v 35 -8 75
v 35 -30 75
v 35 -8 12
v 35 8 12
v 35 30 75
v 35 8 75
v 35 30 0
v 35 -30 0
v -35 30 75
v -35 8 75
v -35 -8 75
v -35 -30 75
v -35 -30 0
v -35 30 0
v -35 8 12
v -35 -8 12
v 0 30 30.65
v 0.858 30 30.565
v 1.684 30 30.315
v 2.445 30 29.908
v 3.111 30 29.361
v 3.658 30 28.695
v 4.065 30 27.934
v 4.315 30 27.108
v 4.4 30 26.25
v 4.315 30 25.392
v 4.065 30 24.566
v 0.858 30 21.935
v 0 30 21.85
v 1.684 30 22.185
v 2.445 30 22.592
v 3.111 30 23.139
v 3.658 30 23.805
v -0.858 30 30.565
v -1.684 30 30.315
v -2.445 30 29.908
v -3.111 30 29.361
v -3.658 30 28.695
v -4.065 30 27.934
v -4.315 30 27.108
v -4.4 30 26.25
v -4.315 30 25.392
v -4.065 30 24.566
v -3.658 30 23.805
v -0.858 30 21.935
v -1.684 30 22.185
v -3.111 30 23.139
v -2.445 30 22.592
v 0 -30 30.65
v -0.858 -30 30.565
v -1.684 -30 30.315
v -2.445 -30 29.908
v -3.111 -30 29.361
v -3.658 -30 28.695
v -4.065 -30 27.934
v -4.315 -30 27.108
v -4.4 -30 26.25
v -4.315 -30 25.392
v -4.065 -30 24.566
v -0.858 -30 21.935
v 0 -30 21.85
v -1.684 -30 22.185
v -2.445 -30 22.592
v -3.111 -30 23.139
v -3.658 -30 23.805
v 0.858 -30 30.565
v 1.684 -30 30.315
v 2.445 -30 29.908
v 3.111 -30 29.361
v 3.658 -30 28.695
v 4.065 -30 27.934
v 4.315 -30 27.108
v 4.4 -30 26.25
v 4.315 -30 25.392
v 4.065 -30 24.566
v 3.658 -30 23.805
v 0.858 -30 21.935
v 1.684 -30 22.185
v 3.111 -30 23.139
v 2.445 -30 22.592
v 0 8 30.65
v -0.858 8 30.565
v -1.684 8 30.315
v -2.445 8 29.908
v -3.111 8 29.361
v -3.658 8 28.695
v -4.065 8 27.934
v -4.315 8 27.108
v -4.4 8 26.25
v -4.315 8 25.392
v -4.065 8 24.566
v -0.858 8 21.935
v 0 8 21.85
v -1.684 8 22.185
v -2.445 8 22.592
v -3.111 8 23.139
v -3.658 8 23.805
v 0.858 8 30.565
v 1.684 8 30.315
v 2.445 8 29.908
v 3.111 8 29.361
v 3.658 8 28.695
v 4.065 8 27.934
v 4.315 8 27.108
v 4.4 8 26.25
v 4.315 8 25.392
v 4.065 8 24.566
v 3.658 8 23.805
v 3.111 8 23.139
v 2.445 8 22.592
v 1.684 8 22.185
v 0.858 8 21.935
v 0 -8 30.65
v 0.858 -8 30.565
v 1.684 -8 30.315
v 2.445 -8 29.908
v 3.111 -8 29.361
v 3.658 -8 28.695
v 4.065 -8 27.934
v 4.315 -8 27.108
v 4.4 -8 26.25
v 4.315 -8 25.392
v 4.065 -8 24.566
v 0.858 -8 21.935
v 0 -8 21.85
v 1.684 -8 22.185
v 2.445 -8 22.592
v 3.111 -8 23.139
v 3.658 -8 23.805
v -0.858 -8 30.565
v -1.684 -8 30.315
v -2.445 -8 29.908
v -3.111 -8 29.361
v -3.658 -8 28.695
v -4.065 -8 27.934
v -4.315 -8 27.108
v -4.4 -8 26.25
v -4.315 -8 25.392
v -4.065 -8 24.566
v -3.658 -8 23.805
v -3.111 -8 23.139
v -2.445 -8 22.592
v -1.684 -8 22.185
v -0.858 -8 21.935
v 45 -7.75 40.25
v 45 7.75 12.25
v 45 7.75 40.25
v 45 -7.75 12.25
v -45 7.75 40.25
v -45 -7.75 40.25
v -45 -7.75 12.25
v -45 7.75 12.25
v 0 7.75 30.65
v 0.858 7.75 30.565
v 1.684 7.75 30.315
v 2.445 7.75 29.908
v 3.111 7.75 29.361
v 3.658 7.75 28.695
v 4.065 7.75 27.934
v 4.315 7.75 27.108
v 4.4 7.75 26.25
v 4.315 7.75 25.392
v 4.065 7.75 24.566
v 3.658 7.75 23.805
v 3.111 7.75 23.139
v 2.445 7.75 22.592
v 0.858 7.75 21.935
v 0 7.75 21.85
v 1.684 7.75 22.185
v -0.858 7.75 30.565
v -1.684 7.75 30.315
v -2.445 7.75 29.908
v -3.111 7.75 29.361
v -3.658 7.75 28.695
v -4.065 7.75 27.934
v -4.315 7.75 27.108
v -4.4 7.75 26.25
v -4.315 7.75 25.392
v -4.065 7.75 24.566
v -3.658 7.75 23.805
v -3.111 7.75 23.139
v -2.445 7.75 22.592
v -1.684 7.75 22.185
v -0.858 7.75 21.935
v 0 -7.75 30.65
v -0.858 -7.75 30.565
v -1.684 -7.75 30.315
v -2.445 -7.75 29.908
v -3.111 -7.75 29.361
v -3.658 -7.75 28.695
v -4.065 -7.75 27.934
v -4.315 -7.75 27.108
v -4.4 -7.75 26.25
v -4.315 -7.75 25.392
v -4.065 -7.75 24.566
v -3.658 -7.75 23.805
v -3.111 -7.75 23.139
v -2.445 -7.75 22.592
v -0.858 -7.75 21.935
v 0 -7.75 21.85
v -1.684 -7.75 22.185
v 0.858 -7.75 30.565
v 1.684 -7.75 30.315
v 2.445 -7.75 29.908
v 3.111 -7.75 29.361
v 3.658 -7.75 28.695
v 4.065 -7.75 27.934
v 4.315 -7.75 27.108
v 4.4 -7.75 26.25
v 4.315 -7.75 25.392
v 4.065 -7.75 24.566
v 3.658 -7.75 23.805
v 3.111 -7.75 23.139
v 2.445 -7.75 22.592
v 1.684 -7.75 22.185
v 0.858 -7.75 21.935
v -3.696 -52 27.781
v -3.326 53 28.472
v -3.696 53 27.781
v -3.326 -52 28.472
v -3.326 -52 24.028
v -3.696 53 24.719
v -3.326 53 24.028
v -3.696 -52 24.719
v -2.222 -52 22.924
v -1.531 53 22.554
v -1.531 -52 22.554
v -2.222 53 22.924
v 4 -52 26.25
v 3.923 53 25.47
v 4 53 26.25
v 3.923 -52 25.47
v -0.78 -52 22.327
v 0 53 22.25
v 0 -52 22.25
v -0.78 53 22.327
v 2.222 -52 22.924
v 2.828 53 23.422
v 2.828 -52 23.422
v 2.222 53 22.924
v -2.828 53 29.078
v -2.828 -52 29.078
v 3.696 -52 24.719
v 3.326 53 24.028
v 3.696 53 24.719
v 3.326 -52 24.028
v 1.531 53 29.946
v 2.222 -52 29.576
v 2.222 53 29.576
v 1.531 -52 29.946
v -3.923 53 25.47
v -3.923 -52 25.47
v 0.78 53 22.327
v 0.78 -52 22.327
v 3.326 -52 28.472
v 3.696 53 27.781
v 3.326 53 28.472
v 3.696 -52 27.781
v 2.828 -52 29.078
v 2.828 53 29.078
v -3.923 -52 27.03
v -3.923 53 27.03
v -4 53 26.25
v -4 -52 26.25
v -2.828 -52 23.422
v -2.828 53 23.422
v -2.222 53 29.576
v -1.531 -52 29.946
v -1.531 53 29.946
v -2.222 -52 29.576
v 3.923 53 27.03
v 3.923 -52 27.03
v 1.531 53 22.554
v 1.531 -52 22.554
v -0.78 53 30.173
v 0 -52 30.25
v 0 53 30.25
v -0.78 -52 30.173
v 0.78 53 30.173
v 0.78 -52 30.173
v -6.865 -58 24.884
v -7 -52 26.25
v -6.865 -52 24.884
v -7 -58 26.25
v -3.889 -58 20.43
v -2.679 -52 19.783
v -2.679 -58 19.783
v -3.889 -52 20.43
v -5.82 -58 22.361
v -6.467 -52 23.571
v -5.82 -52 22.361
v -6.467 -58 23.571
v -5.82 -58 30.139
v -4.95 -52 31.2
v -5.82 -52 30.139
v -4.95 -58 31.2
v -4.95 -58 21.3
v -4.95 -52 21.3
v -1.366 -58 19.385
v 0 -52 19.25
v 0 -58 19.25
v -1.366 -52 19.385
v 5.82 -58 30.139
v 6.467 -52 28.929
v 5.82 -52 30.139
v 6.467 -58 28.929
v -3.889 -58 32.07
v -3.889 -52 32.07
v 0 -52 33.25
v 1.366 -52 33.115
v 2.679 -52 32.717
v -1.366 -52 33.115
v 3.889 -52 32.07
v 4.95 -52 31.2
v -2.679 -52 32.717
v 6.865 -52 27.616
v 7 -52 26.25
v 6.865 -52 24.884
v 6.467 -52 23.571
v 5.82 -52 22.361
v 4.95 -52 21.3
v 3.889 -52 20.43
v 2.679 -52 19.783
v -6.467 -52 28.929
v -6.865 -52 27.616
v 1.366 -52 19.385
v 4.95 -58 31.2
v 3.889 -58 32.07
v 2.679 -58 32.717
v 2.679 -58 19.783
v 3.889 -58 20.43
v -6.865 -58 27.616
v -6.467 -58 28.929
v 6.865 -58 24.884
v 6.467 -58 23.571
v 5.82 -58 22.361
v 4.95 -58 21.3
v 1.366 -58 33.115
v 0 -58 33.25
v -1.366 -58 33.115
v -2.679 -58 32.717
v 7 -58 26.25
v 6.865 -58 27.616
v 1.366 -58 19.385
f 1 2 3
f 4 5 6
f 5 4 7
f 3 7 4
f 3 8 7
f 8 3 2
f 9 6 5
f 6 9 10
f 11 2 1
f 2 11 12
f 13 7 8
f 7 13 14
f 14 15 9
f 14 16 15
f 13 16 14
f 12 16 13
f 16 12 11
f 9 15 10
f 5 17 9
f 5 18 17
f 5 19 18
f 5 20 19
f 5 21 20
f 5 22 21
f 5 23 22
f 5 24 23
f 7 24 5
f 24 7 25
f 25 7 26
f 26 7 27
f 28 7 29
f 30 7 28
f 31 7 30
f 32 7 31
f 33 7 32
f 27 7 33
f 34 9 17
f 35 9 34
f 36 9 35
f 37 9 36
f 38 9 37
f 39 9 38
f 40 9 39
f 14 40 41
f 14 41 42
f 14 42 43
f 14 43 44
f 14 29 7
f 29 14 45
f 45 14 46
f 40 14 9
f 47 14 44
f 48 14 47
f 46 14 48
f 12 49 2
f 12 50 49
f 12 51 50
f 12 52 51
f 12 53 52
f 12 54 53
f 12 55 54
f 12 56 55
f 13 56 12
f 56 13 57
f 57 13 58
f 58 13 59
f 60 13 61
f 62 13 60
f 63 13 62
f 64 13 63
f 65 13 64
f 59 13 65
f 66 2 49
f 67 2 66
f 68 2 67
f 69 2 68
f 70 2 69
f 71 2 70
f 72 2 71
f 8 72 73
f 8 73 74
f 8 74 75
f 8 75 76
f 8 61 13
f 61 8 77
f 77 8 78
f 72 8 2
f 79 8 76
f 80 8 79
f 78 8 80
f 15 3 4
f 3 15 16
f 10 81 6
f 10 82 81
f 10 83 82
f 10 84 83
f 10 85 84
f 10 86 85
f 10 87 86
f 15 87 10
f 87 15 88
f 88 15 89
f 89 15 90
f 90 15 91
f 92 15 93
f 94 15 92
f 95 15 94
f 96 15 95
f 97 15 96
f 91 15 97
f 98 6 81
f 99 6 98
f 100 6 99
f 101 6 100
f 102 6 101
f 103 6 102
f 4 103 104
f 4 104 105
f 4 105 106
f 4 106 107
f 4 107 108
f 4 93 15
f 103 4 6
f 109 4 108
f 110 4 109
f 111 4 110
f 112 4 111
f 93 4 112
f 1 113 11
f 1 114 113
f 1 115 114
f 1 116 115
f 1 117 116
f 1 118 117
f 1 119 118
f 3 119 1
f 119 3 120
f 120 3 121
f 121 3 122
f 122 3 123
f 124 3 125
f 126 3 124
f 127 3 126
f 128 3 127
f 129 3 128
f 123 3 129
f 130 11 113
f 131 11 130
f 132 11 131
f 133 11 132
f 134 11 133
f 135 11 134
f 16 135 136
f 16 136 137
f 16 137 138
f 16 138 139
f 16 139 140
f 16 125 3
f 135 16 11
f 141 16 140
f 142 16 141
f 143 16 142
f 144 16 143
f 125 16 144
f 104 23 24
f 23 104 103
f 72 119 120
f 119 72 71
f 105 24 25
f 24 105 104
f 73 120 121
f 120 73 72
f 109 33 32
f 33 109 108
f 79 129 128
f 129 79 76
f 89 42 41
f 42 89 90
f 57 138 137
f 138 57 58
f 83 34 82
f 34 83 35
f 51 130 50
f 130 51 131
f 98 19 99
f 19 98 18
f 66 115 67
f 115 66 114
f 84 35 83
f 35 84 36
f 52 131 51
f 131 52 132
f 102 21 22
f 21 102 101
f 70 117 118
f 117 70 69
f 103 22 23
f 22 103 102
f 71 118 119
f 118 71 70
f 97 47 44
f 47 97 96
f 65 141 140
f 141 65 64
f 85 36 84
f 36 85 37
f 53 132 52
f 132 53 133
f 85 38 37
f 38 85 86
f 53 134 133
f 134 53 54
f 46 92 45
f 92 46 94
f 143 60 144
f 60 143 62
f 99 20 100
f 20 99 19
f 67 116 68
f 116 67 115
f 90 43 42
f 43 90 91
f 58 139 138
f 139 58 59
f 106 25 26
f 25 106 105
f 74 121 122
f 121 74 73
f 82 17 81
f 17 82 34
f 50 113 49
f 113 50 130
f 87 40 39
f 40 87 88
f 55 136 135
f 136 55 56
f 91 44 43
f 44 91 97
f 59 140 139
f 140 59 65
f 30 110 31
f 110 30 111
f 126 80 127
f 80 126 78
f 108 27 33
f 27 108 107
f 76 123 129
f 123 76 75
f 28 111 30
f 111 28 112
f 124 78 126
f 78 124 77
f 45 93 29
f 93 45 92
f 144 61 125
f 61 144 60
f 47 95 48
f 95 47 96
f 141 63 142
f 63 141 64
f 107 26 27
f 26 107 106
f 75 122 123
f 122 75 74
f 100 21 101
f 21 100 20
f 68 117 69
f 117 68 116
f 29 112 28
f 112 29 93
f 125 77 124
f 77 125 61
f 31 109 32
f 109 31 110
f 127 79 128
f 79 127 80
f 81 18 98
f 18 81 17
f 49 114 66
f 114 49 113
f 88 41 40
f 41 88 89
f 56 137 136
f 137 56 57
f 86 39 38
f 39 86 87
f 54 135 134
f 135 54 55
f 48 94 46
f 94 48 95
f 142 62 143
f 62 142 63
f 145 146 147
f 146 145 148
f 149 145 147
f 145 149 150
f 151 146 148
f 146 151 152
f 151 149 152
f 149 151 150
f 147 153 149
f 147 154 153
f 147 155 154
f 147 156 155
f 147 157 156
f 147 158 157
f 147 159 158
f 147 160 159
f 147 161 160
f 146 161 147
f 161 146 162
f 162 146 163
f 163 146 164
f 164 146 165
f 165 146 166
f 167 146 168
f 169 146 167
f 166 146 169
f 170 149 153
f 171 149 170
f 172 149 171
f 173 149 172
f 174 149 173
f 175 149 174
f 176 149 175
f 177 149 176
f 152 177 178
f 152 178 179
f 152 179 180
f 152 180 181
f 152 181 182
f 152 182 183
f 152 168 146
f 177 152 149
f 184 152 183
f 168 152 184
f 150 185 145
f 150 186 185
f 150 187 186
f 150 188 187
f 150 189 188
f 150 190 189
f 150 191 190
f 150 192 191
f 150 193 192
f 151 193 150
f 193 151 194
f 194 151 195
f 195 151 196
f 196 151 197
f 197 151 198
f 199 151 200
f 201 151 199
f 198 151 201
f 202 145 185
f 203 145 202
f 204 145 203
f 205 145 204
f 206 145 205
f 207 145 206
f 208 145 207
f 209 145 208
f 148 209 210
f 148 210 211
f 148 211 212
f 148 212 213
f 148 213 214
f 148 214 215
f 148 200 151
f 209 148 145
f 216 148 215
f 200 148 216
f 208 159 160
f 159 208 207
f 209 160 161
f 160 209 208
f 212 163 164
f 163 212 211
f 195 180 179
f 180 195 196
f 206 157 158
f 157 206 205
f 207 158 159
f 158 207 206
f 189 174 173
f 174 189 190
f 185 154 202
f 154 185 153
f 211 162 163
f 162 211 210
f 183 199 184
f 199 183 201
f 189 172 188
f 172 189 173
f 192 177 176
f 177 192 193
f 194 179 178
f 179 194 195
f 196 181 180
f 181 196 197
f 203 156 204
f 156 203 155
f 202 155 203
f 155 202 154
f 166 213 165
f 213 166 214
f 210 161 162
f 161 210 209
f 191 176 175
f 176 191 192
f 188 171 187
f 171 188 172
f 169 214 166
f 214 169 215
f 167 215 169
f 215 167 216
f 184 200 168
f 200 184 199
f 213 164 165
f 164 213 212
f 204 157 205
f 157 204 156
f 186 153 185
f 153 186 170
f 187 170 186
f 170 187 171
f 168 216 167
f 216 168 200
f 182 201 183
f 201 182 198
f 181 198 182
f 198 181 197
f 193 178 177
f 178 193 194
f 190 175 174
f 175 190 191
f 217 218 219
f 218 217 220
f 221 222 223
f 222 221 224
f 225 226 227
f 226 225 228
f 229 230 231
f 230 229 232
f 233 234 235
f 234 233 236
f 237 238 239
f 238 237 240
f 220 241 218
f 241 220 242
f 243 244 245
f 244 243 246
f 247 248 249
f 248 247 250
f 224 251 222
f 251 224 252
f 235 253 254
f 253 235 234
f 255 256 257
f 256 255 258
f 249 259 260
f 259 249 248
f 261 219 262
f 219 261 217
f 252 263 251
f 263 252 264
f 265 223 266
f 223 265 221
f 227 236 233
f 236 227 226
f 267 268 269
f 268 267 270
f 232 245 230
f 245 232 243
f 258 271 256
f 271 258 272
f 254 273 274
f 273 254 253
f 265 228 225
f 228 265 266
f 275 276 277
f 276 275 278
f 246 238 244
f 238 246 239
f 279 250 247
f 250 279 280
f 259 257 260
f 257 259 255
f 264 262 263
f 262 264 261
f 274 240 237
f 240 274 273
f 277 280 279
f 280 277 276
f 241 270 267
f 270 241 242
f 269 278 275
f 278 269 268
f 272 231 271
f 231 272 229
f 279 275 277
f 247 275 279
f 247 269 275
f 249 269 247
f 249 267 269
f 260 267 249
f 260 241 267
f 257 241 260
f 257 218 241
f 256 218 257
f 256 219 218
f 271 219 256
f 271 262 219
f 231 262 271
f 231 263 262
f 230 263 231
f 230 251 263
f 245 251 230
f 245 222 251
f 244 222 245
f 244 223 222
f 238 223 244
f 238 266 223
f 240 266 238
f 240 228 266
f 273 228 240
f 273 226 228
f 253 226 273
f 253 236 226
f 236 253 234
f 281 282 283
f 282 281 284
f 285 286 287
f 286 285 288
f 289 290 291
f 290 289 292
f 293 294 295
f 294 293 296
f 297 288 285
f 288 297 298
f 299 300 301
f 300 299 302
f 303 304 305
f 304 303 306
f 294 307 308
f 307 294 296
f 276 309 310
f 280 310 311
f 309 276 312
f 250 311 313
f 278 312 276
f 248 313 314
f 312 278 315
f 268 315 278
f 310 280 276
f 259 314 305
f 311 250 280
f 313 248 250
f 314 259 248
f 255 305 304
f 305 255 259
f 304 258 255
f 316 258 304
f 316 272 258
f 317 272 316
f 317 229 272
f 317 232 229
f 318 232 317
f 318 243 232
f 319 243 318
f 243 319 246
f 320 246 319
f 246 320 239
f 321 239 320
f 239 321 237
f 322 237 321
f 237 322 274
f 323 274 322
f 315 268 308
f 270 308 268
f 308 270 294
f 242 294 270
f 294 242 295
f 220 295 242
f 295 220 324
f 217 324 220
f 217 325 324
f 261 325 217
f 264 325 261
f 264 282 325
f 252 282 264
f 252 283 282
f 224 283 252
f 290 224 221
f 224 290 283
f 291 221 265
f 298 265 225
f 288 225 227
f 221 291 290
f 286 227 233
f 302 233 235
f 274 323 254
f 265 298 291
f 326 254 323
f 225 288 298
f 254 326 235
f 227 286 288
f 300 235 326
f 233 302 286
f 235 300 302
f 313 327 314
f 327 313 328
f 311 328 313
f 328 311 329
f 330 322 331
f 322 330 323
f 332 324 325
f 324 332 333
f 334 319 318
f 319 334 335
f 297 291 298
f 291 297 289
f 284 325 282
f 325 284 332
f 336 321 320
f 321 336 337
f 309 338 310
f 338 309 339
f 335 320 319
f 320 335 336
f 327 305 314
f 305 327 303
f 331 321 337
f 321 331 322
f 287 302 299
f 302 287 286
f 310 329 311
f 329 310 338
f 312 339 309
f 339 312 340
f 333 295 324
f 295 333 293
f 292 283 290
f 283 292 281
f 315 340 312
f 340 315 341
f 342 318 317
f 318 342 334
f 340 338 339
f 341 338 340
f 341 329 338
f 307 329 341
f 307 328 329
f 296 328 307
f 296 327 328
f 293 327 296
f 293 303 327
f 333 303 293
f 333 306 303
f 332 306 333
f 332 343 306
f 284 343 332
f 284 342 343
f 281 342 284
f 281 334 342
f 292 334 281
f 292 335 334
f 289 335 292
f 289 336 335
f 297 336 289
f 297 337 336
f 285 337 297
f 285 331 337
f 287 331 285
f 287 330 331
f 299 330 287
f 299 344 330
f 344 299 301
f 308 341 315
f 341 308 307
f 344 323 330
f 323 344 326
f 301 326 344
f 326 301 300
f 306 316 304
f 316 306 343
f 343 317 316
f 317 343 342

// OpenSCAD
$fn = 32;

// ------------------------------------------------------------------------
// Clevis joint: 70 mm clevis, pin d8
// Every part is its own module, assembly() places them once.
// ------------------------------------------------------------------------

// --- part 1 ---
module clevis() {
  difference() {
    translate([-35, -30, 0]) cube([70, 60, 75]);
    translate([-36, -8, 12]) cube([72, 16, 64]);
    translate([0, 0, 26.25]) rotate([90, 0, 0]) cylinder(h = 62, d = 8.8, center = true);
  }
}

// --- part 2 ---
module eye() {
  difference() {
    translate([-45, -7.75, 0]) cube([90, 15.5, 28]);
    translate([0, 0, 14]) rotate([90, 0, 0]) cylinder(h = 17.5, d = 8.8, center = true);
  }
}

// --- part 3 ---
module pin() {
  rotate([0, 90, 0]) cylinder(h = 106, d = 8, center = true);
  translate([-58, 0, 0]) rotate([0, 90, 0]) cylinder(h = 6, d = 14);
}

// --- assembly ---
module assembly() {
  translate([0, 0, 0]) rotate([0, 0, 0]) clevis();
  translate([0, 0, 12.25]) rotate([0, 0, 0]) eye();
  translate([0, 0, 26.25]) rotate([0, 0, 90]) pin();
}

assembly();
